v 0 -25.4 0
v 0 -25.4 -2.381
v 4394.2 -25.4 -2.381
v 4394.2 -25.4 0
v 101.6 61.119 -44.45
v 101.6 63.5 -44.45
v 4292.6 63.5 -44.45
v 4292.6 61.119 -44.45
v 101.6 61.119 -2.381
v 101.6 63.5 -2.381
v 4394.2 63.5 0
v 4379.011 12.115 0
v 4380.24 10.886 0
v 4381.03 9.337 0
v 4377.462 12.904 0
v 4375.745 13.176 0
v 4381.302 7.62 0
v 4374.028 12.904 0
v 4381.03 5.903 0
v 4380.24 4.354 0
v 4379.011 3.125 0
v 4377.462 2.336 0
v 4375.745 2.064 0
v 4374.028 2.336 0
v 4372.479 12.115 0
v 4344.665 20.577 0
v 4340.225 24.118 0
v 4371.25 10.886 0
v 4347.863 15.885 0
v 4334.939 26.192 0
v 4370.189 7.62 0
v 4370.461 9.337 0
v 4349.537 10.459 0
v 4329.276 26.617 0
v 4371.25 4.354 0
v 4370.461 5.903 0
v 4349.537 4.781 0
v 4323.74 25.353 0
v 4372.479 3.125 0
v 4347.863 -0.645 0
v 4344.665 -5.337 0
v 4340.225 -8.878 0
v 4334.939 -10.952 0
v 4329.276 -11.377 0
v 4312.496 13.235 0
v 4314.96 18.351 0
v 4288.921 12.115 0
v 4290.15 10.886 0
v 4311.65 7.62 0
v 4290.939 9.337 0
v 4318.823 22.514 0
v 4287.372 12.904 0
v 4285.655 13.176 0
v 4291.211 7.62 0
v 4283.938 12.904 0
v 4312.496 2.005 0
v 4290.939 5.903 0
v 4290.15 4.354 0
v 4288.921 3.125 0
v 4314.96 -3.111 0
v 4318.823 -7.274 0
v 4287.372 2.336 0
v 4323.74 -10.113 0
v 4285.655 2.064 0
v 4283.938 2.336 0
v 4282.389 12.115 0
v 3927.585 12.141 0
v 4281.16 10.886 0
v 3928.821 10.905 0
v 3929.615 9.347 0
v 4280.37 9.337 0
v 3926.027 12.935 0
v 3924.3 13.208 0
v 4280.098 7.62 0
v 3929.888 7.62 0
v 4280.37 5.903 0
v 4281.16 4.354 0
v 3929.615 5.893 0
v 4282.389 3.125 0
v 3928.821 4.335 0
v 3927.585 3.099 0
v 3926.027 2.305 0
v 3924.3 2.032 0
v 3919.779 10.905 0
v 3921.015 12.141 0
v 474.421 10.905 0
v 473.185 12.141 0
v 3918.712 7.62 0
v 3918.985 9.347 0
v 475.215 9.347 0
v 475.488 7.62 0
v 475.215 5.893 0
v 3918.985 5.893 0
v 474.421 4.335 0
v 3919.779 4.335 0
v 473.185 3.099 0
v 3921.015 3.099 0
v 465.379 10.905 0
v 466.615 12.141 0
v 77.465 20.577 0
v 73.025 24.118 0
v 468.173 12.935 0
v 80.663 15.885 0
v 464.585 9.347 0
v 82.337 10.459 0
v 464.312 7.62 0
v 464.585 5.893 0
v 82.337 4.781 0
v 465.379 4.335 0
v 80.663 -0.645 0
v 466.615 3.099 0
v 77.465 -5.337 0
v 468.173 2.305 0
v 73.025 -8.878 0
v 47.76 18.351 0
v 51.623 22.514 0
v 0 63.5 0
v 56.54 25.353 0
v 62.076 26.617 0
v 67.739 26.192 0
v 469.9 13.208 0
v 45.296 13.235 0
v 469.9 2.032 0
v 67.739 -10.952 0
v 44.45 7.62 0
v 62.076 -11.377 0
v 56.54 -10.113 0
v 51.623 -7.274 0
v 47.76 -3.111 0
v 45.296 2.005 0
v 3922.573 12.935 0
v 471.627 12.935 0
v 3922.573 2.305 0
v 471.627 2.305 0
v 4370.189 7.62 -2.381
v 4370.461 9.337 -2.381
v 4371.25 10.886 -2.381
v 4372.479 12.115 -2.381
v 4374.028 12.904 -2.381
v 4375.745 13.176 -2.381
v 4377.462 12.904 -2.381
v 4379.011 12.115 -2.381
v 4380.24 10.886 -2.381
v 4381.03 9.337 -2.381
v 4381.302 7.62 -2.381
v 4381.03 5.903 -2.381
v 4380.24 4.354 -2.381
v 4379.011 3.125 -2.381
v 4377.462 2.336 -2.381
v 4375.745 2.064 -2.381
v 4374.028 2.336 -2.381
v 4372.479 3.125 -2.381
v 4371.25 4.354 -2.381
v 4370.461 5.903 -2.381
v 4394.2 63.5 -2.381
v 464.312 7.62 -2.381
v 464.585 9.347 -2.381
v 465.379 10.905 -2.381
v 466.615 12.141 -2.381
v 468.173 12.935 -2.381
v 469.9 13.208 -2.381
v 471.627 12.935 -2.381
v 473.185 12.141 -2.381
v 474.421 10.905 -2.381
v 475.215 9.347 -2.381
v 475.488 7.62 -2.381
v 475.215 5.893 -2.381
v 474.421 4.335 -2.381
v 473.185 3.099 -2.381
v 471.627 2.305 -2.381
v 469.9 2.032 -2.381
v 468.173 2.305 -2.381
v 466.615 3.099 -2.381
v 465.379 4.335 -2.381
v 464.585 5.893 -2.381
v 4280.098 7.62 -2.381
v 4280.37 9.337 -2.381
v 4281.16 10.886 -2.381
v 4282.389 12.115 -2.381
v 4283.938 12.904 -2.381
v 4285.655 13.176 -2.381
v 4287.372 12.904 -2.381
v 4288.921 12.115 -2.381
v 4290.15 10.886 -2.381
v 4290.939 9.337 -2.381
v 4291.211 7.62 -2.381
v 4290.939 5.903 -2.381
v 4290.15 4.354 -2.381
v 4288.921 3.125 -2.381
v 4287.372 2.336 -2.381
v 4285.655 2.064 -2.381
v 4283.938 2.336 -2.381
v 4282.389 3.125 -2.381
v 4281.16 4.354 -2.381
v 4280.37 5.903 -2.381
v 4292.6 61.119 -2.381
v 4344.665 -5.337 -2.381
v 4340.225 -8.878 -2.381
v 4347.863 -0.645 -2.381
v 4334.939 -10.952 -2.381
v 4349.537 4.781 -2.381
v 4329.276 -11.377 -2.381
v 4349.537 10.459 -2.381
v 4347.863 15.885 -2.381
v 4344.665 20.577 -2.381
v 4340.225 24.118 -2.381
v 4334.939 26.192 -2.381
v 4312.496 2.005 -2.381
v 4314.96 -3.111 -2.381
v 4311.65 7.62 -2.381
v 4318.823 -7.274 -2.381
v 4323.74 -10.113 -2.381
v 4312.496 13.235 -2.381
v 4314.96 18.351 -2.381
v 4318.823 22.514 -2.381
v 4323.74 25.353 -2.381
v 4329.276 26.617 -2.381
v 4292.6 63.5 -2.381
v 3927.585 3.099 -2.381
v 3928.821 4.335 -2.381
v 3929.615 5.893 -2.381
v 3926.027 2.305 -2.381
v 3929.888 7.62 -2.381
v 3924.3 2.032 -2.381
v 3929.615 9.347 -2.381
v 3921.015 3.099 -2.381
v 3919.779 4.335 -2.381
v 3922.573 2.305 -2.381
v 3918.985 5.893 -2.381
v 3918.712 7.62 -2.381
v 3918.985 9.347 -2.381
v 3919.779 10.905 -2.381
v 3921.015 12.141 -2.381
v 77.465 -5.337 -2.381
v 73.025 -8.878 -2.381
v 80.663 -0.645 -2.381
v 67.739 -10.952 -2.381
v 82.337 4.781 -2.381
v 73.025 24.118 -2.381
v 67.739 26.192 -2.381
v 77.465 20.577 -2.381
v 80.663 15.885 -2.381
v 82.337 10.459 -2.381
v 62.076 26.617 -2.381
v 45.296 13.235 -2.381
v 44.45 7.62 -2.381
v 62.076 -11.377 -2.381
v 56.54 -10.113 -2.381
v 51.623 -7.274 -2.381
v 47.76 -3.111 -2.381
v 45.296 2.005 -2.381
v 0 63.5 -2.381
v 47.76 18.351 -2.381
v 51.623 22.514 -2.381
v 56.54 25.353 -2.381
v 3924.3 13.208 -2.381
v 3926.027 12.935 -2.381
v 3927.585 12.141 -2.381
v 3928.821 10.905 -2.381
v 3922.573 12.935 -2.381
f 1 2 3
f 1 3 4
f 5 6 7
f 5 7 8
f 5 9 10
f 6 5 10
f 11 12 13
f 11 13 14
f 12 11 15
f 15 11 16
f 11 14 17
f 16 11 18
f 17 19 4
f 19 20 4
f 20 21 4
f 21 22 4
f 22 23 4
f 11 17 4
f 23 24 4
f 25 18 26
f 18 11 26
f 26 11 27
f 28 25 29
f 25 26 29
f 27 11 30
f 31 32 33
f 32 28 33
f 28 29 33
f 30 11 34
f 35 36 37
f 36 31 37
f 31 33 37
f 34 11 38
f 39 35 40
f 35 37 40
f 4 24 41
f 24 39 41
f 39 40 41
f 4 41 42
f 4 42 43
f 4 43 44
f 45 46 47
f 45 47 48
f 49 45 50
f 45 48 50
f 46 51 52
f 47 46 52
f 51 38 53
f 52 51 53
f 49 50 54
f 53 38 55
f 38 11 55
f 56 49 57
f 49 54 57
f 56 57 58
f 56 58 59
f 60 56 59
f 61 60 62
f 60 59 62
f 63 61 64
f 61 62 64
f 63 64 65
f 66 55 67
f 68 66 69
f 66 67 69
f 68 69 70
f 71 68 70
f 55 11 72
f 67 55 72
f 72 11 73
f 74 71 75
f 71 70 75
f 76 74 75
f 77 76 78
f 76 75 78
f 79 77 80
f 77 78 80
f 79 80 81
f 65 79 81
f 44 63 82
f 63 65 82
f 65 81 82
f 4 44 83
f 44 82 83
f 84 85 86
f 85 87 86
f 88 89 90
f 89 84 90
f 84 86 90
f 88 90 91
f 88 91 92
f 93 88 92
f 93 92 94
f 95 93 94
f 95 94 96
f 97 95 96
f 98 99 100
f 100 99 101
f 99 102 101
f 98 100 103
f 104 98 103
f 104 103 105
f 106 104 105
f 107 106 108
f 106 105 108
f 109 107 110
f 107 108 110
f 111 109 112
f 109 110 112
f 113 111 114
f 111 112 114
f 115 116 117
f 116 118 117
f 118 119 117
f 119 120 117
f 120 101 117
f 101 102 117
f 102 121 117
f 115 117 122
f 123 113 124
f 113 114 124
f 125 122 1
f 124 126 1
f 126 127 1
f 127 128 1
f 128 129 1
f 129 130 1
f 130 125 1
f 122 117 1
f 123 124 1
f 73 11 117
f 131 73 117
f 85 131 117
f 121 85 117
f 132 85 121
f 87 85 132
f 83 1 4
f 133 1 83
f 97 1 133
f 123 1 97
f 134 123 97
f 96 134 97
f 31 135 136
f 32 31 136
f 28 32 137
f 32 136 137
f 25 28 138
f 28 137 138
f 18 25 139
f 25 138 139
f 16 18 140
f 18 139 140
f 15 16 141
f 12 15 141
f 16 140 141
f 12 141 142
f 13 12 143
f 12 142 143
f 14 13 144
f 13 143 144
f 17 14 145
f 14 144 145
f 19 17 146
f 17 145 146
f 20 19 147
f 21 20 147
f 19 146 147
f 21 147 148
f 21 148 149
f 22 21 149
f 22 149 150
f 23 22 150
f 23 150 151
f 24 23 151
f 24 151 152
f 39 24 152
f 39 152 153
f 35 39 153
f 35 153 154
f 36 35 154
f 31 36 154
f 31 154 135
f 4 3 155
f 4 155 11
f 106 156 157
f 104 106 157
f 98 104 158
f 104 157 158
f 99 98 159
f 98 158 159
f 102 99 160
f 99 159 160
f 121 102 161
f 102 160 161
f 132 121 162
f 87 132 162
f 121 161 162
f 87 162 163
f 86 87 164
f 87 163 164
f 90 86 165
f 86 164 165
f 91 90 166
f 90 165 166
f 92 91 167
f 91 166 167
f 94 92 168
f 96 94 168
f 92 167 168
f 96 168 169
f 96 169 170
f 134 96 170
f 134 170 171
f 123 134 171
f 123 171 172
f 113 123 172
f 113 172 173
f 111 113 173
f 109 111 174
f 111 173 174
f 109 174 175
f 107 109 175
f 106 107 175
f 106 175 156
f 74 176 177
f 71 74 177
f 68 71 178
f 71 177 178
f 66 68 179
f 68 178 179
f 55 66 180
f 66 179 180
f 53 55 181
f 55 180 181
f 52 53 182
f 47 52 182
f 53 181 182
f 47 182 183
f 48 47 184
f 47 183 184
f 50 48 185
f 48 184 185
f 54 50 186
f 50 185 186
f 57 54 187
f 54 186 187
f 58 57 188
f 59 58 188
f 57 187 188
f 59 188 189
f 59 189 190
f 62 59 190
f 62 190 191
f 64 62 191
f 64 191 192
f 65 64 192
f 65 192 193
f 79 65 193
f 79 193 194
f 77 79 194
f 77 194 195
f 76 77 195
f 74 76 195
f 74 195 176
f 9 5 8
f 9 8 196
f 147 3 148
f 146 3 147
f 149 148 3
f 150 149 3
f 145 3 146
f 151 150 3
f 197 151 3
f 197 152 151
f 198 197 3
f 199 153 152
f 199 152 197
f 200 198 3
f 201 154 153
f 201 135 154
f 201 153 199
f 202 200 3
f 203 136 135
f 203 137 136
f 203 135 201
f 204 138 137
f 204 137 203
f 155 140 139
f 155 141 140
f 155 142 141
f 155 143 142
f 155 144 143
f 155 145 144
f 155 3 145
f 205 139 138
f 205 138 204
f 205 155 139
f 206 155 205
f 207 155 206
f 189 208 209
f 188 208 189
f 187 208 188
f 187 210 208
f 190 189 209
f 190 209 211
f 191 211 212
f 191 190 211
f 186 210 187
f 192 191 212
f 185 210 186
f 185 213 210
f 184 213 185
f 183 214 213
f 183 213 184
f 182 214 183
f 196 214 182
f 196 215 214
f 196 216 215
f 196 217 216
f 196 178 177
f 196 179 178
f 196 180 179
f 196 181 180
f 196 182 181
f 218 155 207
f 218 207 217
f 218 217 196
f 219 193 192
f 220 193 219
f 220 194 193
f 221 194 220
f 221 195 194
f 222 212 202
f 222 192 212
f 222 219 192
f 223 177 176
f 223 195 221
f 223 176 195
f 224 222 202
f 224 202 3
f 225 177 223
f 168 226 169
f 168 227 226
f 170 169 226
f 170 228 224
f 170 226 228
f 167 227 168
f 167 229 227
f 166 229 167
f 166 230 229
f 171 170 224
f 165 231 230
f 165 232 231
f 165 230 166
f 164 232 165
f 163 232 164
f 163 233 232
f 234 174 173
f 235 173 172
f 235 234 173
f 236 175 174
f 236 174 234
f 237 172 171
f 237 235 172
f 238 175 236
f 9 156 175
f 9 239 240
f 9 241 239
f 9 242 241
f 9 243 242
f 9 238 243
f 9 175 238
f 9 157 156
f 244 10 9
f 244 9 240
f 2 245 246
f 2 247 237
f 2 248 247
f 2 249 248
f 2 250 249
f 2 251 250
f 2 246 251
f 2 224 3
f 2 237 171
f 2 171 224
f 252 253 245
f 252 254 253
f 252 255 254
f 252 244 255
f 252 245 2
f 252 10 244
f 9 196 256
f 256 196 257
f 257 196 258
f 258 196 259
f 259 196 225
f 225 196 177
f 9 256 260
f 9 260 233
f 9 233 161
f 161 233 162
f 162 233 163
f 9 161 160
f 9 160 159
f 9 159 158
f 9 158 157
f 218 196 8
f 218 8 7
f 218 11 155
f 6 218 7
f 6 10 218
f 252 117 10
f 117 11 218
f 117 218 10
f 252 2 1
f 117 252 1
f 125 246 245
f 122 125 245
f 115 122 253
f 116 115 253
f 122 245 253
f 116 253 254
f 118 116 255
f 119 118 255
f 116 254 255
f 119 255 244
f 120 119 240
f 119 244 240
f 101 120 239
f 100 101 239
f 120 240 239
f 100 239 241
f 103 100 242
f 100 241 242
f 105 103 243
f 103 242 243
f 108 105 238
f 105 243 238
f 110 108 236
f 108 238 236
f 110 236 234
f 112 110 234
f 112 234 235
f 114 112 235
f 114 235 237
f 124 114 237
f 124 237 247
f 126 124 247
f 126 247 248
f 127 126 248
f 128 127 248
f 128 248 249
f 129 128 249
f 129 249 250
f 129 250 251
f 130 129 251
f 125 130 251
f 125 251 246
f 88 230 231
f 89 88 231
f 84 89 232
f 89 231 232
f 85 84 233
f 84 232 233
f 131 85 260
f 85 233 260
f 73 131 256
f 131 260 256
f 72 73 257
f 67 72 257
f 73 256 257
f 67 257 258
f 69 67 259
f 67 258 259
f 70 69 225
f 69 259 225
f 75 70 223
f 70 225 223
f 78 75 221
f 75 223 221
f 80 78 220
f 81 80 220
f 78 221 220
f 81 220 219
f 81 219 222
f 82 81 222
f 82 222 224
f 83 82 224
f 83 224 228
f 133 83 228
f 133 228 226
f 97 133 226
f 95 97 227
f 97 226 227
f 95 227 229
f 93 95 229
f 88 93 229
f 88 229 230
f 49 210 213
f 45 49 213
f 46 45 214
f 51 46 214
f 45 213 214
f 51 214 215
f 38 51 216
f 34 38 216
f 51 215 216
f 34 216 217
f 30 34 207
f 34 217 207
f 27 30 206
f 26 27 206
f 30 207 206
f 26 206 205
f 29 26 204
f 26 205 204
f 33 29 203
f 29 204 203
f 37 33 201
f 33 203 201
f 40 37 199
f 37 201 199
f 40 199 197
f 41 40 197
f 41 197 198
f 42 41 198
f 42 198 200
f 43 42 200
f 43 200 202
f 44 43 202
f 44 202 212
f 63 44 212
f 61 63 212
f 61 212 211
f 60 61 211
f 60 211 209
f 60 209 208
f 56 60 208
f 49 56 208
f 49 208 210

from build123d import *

# Parameters (mm, degrees)
BOSS_EXTRUDE1_DEPTH = 4394.2
CUT_EXTRUDE1_REACH  = 4396.86
SKETCH2_R           = 19.05
SKETCH2_R_2         = 5.55625
CUT_EXTRUDE4_REACH  = 4396.86
SKETCH3_W           = 101.6
SKETCH3_H           = 2.38125
SKETCH4_R           = 5.588
SKETCH4_R_2         = 19.05
CUT_EXTRUDE5_DEPTH  = 2.38125


with BuildPart() as part:
    # Sketch1 → Boss-Extrude1 (new body)
    with BuildSketch(Plane(origin=(0, 0, 0), x_dir=(0, 0, -1), z_dir=(1, 0, 0))):
        Polygon((0, 0), (0, 63.5), (44.45, 63.5), (44.45, 61.11875), (2.38125, 61.11875), (2.38125, 0), (2.38125, -25.4), (0, -25.4), align=None)
    extrude(amount=BOSS_EXTRUDE1_DEPTH)

    # Sketch2 → Cut-Extrude1 (cut, up to next)
    with BuildSketch(Plane(origin=(0, 0, -2.38125), x_dir=(-1, 0, 0), z_dir=(0, 0, -1)), mode=Mode.PRIVATE) as cut_extrude1_sk1:
        with Locations((-4330.7, 7.62)):
            Circle(SKETCH2_R)
    cut_extrude1_tool1 = extrude(cut_extrude1_sk1.sketch, amount=-CUT_EXTRUDE1_REACH, mode=Mode.PRIVATE) & part.part
    # Sketch2 → Cut-Extrude1 (cut, up to next)
    with BuildSketch(Plane(origin=(0, 0, -2.38125), x_dir=(-1, 0, 0), z_dir=(0, 0, -1)), mode=Mode.PRIVATE) as cut_extrude1_sk2:
        with Locations((-63.5, 7.62)):
            Circle(SKETCH2_R)
    cut_extrude1_tool2 = extrude(cut_extrude1_sk2.sketch, amount=-CUT_EXTRUDE1_REACH, mode=Mode.PRIVATE) & part.part
    # Sketch2 → Cut-Extrude1 (cut, up to next)
    with BuildSketch(Plane(origin=(0, 0, -2.38125), x_dir=(-1, 0, 0), z_dir=(0, 0, -1)), mode=Mode.PRIVATE) as cut_extrude1_sk3:
        with Locations((-4285.6546875, 7.62)):
            Circle(SKETCH2_R_2)
    cut_extrude1_tool3 = extrude(cut_extrude1_sk3.sketch, amount=-CUT_EXTRUDE1_REACH, mode=Mode.PRIVATE) & part.part
    # Sketch2 → Cut-Extrude1 (cut, up to next)
    with BuildSketch(Plane(origin=(0, 0, -2.38125), x_dir=(-1, 0, 0), z_dir=(0, 0, -1)), mode=Mode.PRIVATE) as cut_extrude1_sk4:
        with Locations((-4375.7453125, 7.62)):
            Circle(SKETCH2_R_2)
    cut_extrude1_tool4 = extrude(cut_extrude1_sk4.sketch, amount=-CUT_EXTRUDE1_REACH, mode=Mode.PRIVATE) & part.part
    add(cut_extrude1_tool1.solids().sort_by_distance((4330.7, 7.62, -2.38125))[0], mode=Mode.SUBTRACT)
    add(cut_extrude1_tool2.solids().sort_by_distance((63.5, 7.62, -2.38125))[0], mode=Mode.SUBTRACT)
    add(cut_extrude1_tool3.solids().sort_by_distance((4285.654687, 7.62, -2.38125))[0], mode=Mode.SUBTRACT)
    add(cut_extrude1_tool4.solids().sort_by_distance((4375.745312, 7.62, -2.38125))[0], mode=Mode.SUBTRACT)

    # Sketch3 → Cut-Extrude4 (cut, up to next)
    with BuildSketch(Plane(origin=(0, 0, -2.38125), x_dir=(-1, 0, 0), z_dir=(0, 0, -1)), mode=Mode.PRIVATE) as cut_extrude4_sk1:
        with Locations((-4343.4, 62.309375)):
            Rectangle(SKETCH3_W, SKETCH3_H)
    cut_extrude4_tool1 = extrude(cut_extrude4_sk1.sketch, amount=CUT_EXTRUDE4_REACH, mode=Mode.PRIVATE) & part.part
    # Sketch3 → Cut-Extrude4 (cut, up to next)
    with BuildSketch(Plane(origin=(0, 0, -2.38125), x_dir=(-1, 0, 0), z_dir=(0, 0, -1)), mode=Mode.PRIVATE) as cut_extrude4_sk2:
        with Locations((-50.8, 62.309375)):
            Rectangle(SKETCH3_W, SKETCH3_H)
    cut_extrude4_tool2 = extrude(cut_extrude4_sk2.sketch, amount=CUT_EXTRUDE4_REACH, mode=Mode.PRIVATE) & part.part
    add(cut_extrude4_tool1.solids().sort_by_distance((4343.4, 62.309375, -2.38125))[0], mode=Mode.SUBTRACT)
    add(cut_extrude4_tool2.solids().sort_by_distance((50.8, 62.309375, -2.38125))[0], mode=Mode.SUBTRACT)

    # Sketch4 → Cut-Extrude5 (cut)
    with BuildSketch(Plane(origin=(0, 0, -2.38125), x_dir=(-1, 0, 0), z_dir=(0, 0, -1))):
        with Locations((-3924.3, 7.62)):
            Circle(SKETCH4_R)
        with Locations((-469.9, 7.62)):
            Circle(SKETCH4_R)
        with Locations((-63.5, 7.62)):
            Circle(SKETCH4_R_2)
    extrude(amount=-CUT_EXTRUDE5_DEPTH, mode=Mode.SUBTRACT)


solid = part.part
